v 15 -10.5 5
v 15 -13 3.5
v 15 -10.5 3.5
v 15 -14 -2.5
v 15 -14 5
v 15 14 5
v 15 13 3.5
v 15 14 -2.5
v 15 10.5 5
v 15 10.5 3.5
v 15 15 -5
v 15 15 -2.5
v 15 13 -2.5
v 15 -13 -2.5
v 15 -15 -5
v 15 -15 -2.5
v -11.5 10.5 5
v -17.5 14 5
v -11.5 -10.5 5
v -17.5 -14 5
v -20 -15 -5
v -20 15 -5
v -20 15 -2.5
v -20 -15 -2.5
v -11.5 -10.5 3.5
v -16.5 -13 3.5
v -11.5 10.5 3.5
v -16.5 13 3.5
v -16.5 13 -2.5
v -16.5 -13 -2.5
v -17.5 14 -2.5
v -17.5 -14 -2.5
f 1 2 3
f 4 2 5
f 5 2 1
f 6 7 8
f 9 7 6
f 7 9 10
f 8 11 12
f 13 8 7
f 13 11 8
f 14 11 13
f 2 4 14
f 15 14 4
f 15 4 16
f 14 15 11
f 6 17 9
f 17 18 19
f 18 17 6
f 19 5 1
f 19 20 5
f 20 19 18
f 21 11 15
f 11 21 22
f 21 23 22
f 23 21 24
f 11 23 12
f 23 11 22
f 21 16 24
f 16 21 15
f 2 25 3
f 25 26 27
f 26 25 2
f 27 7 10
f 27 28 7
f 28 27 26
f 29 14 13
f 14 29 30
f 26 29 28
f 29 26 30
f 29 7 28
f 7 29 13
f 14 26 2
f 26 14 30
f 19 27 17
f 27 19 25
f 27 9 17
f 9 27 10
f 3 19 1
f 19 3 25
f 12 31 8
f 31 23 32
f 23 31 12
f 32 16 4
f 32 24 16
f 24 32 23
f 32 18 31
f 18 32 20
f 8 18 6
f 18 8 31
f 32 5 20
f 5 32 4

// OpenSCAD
pad_thickness = 10; //[10:10]
pad_x = 35; //[32:0.5:150]
pad_y = 30; //[26:0.5:150]


difference() {
    
    difference() {
        translate ([pad_x/2- pad_x + 15,0,0])
            color ("blue")
                cube([pad_x,pad_y,pad_thickness], center=true)
        ;
        
        translate ([0,0,0.5]) 
            color ("red")
                cube([33,26,6], center=true)
        ;
        
        translate ([2.5,0,pad_thickness/3.5]) 
            color ("Orange")
                cube([28,21,pad_thickness / 2 + 5], center=true)
        ;
    }


    difference() {
        translate ([pad_x/2 - pad_x + 12.6,0,pad_thickness/2 - 2.5]) 
            color ("yellow")
                cube([pad_x + 5,pad_y + 5,pad_thickness], center=true)
        ;
            
        translate ([-1,0,pad_thickness/2 - 2.5]) 
            color ("Aqua")
                cube([33,28,pad_thickness], center=true)
        ;
    }
}
